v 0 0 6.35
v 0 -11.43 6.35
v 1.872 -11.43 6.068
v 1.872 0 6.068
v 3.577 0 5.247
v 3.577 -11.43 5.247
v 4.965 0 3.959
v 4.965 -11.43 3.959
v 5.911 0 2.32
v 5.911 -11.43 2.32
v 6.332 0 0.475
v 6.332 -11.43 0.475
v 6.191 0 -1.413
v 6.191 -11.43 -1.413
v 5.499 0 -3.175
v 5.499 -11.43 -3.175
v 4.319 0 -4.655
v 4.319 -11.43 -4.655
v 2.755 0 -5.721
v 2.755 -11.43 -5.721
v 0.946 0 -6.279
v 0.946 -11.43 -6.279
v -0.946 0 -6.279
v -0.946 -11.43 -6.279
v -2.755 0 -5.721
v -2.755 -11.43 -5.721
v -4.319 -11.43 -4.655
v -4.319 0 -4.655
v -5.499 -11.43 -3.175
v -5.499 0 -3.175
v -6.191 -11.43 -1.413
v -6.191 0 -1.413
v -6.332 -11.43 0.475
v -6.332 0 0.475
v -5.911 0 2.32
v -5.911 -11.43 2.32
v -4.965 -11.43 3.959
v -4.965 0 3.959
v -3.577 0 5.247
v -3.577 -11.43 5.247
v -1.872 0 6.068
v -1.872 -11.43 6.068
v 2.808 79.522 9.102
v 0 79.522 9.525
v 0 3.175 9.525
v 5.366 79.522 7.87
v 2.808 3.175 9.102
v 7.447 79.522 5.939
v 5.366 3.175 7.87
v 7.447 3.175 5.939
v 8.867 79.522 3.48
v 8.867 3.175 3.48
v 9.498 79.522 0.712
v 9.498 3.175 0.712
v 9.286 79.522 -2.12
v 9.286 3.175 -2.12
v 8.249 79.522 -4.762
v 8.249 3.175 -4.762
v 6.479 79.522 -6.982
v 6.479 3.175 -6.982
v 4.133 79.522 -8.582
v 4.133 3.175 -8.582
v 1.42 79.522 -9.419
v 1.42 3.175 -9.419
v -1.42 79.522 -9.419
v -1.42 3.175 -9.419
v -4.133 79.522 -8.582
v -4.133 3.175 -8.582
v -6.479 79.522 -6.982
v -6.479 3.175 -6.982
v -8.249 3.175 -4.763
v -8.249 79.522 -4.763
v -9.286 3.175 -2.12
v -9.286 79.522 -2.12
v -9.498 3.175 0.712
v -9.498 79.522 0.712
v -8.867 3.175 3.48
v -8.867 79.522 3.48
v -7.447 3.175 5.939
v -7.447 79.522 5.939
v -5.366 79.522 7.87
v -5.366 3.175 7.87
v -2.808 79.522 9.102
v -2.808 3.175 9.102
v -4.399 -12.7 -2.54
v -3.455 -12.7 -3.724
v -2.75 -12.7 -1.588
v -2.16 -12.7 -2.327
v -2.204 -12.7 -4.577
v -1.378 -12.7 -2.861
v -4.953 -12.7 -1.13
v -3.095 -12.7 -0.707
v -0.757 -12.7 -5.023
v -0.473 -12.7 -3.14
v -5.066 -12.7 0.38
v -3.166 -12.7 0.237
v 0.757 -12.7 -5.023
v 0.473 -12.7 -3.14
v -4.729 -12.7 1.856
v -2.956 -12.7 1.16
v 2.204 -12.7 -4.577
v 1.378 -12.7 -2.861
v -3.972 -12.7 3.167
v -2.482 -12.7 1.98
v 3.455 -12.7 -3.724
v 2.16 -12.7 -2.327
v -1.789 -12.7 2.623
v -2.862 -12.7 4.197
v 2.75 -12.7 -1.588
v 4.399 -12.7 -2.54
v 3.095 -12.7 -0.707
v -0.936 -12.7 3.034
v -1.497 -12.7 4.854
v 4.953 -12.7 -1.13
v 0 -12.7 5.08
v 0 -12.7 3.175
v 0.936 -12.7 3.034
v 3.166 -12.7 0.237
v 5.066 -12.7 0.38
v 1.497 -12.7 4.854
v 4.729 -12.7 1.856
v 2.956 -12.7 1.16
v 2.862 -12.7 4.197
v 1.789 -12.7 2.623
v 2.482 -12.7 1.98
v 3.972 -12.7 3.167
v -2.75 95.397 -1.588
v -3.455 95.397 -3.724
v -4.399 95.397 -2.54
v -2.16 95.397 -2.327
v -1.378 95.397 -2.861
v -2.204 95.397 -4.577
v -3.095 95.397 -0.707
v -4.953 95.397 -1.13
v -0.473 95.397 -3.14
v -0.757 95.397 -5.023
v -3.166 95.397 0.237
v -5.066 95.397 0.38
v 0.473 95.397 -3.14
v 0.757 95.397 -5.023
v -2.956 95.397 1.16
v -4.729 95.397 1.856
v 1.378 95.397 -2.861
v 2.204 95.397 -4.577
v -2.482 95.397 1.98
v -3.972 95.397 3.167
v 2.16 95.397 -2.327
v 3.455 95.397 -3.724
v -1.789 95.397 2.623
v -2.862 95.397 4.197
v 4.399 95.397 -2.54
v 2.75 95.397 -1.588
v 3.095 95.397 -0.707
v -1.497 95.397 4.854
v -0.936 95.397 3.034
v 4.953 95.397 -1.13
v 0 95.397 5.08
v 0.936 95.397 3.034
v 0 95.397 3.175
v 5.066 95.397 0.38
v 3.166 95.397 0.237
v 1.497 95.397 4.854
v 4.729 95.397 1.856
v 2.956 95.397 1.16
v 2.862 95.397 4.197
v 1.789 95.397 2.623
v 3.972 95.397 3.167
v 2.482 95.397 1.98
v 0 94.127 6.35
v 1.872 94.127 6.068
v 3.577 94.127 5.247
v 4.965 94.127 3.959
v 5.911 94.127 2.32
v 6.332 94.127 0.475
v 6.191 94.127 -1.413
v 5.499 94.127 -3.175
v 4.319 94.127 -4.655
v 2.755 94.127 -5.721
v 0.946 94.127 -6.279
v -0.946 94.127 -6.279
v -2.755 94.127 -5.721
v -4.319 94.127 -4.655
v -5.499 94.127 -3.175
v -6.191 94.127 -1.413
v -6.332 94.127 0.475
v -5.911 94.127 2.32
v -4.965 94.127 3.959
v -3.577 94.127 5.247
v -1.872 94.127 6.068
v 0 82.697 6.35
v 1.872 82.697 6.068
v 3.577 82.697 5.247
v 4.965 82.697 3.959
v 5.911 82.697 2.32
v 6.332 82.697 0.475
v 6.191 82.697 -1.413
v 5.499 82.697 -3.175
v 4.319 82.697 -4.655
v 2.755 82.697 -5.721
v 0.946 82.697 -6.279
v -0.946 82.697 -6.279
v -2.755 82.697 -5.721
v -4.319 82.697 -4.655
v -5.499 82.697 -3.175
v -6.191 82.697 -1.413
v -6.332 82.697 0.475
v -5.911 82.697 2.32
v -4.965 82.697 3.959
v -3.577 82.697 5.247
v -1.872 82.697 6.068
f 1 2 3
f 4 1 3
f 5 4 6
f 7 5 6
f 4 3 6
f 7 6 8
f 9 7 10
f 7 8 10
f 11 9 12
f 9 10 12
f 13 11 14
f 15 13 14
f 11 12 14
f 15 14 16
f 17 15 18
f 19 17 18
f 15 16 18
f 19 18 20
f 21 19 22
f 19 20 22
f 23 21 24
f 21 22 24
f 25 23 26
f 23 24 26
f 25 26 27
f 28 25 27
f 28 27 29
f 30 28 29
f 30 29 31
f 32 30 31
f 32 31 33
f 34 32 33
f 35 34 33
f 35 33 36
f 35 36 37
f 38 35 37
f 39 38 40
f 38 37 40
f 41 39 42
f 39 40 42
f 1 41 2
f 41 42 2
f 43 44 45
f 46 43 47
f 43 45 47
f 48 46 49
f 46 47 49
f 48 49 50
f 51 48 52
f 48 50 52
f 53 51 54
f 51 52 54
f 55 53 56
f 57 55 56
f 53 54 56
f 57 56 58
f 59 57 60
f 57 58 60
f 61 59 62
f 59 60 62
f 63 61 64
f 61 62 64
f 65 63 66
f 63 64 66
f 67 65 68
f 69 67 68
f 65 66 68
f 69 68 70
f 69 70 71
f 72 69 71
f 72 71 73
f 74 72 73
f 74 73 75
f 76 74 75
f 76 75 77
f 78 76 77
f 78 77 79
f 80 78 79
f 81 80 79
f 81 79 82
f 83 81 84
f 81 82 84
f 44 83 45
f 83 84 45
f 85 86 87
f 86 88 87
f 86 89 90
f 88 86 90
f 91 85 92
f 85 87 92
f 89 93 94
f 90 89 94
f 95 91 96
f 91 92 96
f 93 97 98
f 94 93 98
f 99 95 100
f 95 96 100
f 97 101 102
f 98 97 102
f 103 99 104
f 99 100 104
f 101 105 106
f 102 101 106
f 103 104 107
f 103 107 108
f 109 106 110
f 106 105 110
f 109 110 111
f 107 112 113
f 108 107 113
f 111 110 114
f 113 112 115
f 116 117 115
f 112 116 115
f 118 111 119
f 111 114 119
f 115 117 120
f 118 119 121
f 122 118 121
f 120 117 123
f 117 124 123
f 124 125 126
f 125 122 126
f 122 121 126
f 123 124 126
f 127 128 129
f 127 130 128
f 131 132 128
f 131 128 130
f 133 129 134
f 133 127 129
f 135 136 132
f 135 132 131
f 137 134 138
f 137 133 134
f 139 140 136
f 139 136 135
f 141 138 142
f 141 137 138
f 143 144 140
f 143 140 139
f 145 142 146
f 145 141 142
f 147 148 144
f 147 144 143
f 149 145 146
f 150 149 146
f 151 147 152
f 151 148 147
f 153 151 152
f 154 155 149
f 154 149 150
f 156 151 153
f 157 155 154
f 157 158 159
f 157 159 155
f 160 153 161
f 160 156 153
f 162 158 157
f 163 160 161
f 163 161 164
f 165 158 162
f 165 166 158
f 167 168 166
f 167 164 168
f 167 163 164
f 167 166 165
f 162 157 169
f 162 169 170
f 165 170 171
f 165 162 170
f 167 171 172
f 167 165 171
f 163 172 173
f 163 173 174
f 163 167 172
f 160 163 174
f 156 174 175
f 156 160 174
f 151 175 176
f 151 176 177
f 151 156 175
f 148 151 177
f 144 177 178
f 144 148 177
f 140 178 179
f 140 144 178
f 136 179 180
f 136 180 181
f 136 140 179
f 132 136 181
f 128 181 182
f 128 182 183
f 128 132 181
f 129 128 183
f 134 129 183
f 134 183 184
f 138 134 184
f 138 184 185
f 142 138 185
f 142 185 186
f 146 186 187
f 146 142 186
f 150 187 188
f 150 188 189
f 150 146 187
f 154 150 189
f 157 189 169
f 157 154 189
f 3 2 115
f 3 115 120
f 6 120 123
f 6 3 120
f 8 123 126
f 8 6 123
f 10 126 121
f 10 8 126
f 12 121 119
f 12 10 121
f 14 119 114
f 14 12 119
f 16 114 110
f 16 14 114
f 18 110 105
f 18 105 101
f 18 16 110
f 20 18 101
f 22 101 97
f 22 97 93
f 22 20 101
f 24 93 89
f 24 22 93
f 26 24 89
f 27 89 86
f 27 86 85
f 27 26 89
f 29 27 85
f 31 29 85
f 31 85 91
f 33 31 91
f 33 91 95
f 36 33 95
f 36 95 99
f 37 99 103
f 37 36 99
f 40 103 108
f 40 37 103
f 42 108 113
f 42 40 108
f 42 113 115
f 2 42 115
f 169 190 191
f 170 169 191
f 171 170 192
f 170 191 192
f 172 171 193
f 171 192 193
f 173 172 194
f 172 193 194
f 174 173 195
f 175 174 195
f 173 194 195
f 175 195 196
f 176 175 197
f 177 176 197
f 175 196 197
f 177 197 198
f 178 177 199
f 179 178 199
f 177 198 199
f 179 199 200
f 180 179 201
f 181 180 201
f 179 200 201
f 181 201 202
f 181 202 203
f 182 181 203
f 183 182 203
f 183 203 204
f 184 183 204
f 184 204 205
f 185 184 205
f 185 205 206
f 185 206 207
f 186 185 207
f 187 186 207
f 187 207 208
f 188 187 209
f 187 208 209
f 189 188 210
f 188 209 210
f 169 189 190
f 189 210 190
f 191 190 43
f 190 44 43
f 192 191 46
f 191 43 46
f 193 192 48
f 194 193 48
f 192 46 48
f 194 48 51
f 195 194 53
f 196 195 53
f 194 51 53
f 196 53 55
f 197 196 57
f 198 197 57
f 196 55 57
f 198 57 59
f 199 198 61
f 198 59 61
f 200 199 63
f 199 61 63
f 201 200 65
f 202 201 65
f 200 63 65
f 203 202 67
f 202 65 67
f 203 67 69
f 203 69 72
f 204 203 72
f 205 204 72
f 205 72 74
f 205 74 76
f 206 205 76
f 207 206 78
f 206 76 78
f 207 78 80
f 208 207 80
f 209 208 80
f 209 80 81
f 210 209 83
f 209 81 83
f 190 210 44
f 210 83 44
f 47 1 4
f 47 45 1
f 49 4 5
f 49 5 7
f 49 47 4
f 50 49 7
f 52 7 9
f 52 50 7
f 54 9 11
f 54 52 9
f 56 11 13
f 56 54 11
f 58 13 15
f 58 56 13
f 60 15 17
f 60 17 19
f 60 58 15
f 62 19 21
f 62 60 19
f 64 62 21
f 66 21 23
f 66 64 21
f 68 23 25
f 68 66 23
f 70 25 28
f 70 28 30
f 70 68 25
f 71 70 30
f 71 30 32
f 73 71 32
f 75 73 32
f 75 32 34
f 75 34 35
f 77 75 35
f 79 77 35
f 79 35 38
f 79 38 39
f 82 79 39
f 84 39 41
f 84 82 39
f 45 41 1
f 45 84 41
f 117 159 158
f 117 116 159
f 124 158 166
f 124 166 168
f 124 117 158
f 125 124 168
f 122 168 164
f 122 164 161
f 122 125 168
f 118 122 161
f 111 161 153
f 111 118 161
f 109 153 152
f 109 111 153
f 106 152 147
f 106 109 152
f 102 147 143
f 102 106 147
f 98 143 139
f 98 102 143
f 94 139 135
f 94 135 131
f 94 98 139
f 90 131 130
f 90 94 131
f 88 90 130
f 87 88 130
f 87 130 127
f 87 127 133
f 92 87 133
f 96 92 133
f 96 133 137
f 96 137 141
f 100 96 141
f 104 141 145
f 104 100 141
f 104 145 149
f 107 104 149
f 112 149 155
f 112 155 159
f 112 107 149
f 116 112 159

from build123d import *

# Parameters (mm, degrees)
SKETCH1_R           = 9.525
SKETCH1_R_2         = 3.175
SKETCH1_R_3         = 6.35
BOSS_EXTRUDE1_DEPTH = 82.69732
CHAMFER1_SIZE       = 3.175
BOSS_EXTRUDE2_START = -12.7
SKETCH1_3_R         = 6.35
SKETCH1_3_R_2       = 3.175
BOSS_EXTRUDE2_DEPTH = 12.7
BOSS_EXTRUDE3_START = 82.69732
SKETCH1_4_R         = 6.35
SKETCH1_4_R_2       = 3.175
BOSS_EXTRUDE3_DEPTH = 12.7
CHAMFER2_SIZE       = 1.27


with BuildPart() as part:
    # Sketch1 → Boss-Extrude1 (new body)
    # profile 1 of 2: a face of its own
    with BuildSketch(Plane(origin=(0, 0, 0), x_dir=(1, 0, 0), z_dir=(0, 1, 0))):
        with Locations(Location((0, 0, 0), (0, 0, 270))):
            Circle(SKETCH1_R)
        with Locations(Location((0, 0, 0), (0, 0, 270))):
            Circle(SKETCH1_R_2, mode=Mode.SUBTRACT)
    # profile 2 of 2: a face of its own
    with BuildSketch(Plane(origin=(0, 0, 0), x_dir=(1, 0, 0), z_dir=(0, 1, 0))):
        Circle(SKETCH1_R_3)
        with Locations(Location((0, 0, 0), (0, 0, 270))):
            Circle(SKETCH1_R_2, mode=Mode.SUBTRACT)
    extrude(amount=BOSS_EXTRUDE1_DEPTH)

    # Chamfer1
    chamfer1_edges = [part.edges().sort_by_distance(p)[0] for p in [
        (0, 0, -9.525),
        (0, 82.69732, -9.525),
    ]]
    chamfer(chamfer1_edges, length=CHAMFER1_SIZE)

    # Sketch1<3> → Boss-Extrude2 (add)
    with BuildSketch(Plane(origin=(0, 0, 0), x_dir=(1, 0, 0), z_dir=(0, 1, 0)).offset(BOSS_EXTRUDE2_START)):
        with Locations(Location((0, 0, 0), (0, 0, 270))):
            Circle(SKETCH1_3_R)
        with Locations(Location((0, 0, 0), (0, 0, 270))):
            Circle(SKETCH1_3_R_2, mode=Mode.SUBTRACT)
    extrude(amount=BOSS_EXTRUDE2_DEPTH)

    # Sketch1<4> → Boss-Extrude3 (add)
    with BuildSketch(Plane(origin=(0, 0, 0), x_dir=(1, 0, 0), z_dir=(0, 1, 0)).offset(BOSS_EXTRUDE3_START)):
        with Locations(Location((0, 0, 0), (0, 0, 270))):
            Circle(SKETCH1_4_R)
        with Locations(Location((0, 0, 0), (0, 0, 270))):
            Circle(SKETCH1_4_R_2, mode=Mode.SUBTRACT)
    extrude(amount=BOSS_EXTRUDE3_DEPTH)

    # Chamfer2
    chamfer2_edges = [part.edges().sort_by_distance(p)[0] for p in [
        (0, -12.7, -6.35),
        (0, 95.39732, -6.35),
    ]]
    chamfer(chamfer2_edges, length=CHAMFER2_SIZE)


solid = part.part
